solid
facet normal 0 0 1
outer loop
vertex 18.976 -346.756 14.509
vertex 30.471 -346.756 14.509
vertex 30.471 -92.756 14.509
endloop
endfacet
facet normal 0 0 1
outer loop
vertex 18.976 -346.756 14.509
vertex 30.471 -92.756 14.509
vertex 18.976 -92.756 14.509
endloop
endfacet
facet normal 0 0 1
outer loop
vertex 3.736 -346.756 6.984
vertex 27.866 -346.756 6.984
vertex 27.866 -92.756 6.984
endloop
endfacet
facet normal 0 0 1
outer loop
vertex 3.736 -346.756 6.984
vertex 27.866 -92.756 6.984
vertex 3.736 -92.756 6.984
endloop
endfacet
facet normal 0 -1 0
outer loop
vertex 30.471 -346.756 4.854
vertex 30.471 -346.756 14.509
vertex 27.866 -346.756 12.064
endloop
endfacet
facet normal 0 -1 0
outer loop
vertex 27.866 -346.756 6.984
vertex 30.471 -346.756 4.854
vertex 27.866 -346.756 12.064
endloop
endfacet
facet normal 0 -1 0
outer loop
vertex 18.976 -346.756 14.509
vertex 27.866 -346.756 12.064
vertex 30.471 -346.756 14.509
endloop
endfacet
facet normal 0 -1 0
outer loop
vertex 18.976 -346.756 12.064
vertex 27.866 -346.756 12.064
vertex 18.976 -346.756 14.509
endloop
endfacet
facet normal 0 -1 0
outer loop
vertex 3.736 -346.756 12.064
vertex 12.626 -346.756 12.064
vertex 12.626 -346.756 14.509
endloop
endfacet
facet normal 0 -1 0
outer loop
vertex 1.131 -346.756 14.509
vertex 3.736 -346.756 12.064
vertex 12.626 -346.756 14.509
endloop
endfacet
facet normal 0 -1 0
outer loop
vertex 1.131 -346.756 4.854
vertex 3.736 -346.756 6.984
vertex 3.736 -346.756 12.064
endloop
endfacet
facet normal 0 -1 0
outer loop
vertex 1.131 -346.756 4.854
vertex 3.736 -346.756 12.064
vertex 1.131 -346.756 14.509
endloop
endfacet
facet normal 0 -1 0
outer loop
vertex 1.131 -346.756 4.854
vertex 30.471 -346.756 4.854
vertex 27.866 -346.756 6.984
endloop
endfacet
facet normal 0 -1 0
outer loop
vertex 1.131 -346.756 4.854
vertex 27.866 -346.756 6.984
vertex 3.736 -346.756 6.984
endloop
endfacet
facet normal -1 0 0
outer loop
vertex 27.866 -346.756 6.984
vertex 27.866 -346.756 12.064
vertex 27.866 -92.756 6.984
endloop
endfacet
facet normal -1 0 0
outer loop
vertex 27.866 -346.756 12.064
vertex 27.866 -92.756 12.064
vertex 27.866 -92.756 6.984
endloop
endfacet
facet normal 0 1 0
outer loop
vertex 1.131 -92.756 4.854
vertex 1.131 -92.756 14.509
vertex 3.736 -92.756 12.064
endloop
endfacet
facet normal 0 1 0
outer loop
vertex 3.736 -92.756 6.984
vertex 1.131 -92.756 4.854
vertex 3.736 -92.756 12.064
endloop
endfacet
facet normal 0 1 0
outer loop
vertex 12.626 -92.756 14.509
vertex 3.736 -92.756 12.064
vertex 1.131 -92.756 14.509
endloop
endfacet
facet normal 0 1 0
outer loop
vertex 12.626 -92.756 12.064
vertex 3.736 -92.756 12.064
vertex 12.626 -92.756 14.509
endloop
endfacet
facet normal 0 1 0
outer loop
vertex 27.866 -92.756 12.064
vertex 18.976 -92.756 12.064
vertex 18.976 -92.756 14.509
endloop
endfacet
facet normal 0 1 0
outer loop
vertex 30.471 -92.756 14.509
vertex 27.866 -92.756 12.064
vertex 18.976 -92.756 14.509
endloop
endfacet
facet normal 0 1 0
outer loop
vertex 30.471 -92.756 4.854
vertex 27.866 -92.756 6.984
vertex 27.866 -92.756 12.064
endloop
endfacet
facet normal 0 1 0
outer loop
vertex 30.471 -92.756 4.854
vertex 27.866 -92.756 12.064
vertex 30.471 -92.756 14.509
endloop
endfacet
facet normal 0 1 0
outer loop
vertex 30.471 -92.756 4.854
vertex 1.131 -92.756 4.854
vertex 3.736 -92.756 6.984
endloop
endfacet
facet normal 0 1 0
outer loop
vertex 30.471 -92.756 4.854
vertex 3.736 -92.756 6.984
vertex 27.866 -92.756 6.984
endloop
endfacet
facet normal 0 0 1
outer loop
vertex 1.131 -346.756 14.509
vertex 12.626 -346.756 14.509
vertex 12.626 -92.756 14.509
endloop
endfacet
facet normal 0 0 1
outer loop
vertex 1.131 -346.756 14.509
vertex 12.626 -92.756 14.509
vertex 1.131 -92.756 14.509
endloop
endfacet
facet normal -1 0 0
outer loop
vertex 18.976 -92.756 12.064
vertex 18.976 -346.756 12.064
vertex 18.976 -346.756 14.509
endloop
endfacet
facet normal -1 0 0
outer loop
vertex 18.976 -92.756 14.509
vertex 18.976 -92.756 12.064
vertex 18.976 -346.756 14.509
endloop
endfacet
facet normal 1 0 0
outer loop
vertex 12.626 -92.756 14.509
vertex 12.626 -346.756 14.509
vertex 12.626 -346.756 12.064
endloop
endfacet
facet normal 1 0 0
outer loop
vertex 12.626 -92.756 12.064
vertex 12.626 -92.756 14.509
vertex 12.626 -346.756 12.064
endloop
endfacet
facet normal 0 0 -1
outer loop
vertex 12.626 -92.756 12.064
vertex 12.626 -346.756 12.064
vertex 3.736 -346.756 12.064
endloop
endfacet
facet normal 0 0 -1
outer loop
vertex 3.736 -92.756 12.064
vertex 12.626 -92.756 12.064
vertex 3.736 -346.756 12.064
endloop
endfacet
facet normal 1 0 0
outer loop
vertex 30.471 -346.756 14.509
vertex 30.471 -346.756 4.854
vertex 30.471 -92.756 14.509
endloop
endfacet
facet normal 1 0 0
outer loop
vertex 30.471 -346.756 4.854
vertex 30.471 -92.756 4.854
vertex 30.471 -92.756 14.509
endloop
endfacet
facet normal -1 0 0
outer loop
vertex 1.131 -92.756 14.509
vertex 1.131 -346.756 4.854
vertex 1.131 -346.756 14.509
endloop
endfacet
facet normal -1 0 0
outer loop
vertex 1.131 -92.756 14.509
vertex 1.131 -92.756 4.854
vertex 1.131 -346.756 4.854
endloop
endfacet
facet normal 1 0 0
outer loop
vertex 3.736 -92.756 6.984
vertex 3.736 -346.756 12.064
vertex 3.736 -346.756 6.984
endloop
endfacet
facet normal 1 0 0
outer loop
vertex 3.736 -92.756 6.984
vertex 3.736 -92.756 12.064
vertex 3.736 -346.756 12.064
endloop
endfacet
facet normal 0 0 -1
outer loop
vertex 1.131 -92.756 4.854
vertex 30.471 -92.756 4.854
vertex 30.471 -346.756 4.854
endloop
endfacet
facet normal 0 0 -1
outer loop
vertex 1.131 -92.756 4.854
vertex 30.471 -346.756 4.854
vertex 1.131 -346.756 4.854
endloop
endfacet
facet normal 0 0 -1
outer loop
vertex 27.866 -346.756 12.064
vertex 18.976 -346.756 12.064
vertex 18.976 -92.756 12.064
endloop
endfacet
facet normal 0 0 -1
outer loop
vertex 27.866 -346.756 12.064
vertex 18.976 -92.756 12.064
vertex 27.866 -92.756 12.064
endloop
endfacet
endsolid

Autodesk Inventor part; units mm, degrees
ref_plane "YZ Plane" through (0, 0, 0) normal (1, 0, 0) x (0, 1, 0)
ref_plane "XZ Plane" through (0, 0, 0) normal (0, 1, 0) x (-1, 0, 0)
ref_plane "XY Plane" through (0, 0, 0) normal (0, 0, 1) x (1, 0, 0)
sketch "Sketch1" plane through (0, 0, 0) normal (0, 0, 1) x (1, 0, 0)
  line L0 (-15.9487, -92.7565) -> (47.5513, -92.7565)
  line L1 (47.5513, -92.7565) -> (47.5513, -346.7565)
  line L2 (47.5513, -346.7565) -> (-15.9487, -346.7565)
  line L3 (-15.9487, -346.7565) -> (-15.9487, -92.7565)
  point P0 (0, 0)
  dimension "d0" = 63.5
  dimension "d2" = 254
extrude "Extrusion1" add sketch "Sketch1" along normal blind 19.05
sketch "Sketch2" plane through (-15.9487, -92.7565, 0) normal (0, 1, 0) x (1, 0, 0)
  point P0 (15.9487, 0)
sketch "Sketch3" plane through (-15.9487, -92.7565, 0) normal (0, 1, 0) x (1, 0, 0)
  line L0 (63.5, -19.05) -> (0, -19.05) projected
  line L1 (34.925, -19.05) -> (28.575, -19.05)
  line L2 (28.575, -19.05) -> (28.575, -12.0642)
  line L3 (34.925, -12.0642) -> (34.925, -19.05)
  line L4 (31.75, -19.05) -> (31.75, 0) construction
  line L5 (63.5, 0) -> (63.5, -19.05) projected
  line L6 (28.575, -12.0642) -> (19.685, -12.0642)
  line L7 (19.685, -12.0642) -> (19.685, -6.9842)
  line L8 (19.685, -6.9842) -> (28.575, -6.9842)
  line L9 (34.925, -12.0642) -> (43.815, -12.0642)
  line L10 (43.815, -12.0642) -> (43.815, -6.9842)
  line L11 (43.815, -6.9842) -> (34.925, -6.9842)
  line L12 (34.925, -6.9842) -> (28.575, -6.9842)
  point P0 (15.9487, 0)
  dimension "d6" = 31.75
  dimension "d7" = 8.89
  dimension "d8" = 5.08
  dimension "d9" = 8.89
extrude "Extrusion2" cut sketch "Sketch3" against normal blind 254
sketch "Sketch4" plane through (-15.9487, -92.7565, 0) normal (0, 1, 0) x (1, 0, 0)
  line L0 (63.5, 0) -> (63.5, -19.05) projected
  line L1 (63.5, 0) -> (46.4201, 0)
  line L2 (46.4201, 0) -> (46.4201, -19.05)
  line L3 (46.4201, -19.05) -> (63.5, -19.05)
  line L4 (63.5, -19.05) -> (63.5, 0)
  line L5 (63.5, 0) -> (0, 0) projected
  line L6 (31.75, 0) -> (31.75, -19.05) construction
  line L7 (0, 0) -> (0, -19.05)
  line L8 (0, 0) -> (17.0799, 0)
  line L9 (17.0799, 0) -> (17.0799, -19.05)
  line L10 (0, -19.05) -> (17.0799, -19.05)
  point P0 (15.9487, 0)
extrude "Extrusion3" cut sketch "Sketch4" against normal blind 254
sketch "Sketch5" plane through (3.7363, -92.7565, 6.9842) normal (0, 1, 0) x (1, 0, 0)
  line L0 (-2.6051, 6.9842) -> (-2.6051, -12.0658) projected
  line L1 (26.7351, 6.9842) -> (26.7351, -12.0658) projected
  line L2 (-2.6051, 6.9842) -> (26.7351, 6.9842)
  line L3 (26.7351, 6.9842) -> (26.7351, 2.1306)
  line L4 (26.7351, 2.1306) -> (-2.6051, 2.1306)
  line L5 (-2.6051, 2.1306) -> (-2.6051, 6.9842)
  point P0 (-3.7363, 6.9842)
extrude "Extrusion4" cut sketch "Sketch5" against normal blind 254
sketch "Sketch6" plane through (3.7363, -92.7565, 6.9842) normal (0, 1, 0) x (1, 0, 0)
  line L0 (-2.6051, -12.0658) -> (-2.6051, 2.1306) projected
  line L1 (26.7351, 2.1306) -> (26.7351, -12.0658) projected
  line L2 (-2.6051, -12.0658) -> (26.7351, -12.0658)
  line L3 (26.7351, -12.0658) -> (26.7351, -7.5248)
  line L4 (26.7351, -7.5248) -> (-2.6051, -7.5248)
  line L5 (-2.6051, -7.5248) -> (-2.6051, -12.0658)
  point P0 (-3.7363, 6.9842)
extrude "Extrusion5" cut sketch "Sketch6" against normal blind 254
properties part number "crossbowtrack"
